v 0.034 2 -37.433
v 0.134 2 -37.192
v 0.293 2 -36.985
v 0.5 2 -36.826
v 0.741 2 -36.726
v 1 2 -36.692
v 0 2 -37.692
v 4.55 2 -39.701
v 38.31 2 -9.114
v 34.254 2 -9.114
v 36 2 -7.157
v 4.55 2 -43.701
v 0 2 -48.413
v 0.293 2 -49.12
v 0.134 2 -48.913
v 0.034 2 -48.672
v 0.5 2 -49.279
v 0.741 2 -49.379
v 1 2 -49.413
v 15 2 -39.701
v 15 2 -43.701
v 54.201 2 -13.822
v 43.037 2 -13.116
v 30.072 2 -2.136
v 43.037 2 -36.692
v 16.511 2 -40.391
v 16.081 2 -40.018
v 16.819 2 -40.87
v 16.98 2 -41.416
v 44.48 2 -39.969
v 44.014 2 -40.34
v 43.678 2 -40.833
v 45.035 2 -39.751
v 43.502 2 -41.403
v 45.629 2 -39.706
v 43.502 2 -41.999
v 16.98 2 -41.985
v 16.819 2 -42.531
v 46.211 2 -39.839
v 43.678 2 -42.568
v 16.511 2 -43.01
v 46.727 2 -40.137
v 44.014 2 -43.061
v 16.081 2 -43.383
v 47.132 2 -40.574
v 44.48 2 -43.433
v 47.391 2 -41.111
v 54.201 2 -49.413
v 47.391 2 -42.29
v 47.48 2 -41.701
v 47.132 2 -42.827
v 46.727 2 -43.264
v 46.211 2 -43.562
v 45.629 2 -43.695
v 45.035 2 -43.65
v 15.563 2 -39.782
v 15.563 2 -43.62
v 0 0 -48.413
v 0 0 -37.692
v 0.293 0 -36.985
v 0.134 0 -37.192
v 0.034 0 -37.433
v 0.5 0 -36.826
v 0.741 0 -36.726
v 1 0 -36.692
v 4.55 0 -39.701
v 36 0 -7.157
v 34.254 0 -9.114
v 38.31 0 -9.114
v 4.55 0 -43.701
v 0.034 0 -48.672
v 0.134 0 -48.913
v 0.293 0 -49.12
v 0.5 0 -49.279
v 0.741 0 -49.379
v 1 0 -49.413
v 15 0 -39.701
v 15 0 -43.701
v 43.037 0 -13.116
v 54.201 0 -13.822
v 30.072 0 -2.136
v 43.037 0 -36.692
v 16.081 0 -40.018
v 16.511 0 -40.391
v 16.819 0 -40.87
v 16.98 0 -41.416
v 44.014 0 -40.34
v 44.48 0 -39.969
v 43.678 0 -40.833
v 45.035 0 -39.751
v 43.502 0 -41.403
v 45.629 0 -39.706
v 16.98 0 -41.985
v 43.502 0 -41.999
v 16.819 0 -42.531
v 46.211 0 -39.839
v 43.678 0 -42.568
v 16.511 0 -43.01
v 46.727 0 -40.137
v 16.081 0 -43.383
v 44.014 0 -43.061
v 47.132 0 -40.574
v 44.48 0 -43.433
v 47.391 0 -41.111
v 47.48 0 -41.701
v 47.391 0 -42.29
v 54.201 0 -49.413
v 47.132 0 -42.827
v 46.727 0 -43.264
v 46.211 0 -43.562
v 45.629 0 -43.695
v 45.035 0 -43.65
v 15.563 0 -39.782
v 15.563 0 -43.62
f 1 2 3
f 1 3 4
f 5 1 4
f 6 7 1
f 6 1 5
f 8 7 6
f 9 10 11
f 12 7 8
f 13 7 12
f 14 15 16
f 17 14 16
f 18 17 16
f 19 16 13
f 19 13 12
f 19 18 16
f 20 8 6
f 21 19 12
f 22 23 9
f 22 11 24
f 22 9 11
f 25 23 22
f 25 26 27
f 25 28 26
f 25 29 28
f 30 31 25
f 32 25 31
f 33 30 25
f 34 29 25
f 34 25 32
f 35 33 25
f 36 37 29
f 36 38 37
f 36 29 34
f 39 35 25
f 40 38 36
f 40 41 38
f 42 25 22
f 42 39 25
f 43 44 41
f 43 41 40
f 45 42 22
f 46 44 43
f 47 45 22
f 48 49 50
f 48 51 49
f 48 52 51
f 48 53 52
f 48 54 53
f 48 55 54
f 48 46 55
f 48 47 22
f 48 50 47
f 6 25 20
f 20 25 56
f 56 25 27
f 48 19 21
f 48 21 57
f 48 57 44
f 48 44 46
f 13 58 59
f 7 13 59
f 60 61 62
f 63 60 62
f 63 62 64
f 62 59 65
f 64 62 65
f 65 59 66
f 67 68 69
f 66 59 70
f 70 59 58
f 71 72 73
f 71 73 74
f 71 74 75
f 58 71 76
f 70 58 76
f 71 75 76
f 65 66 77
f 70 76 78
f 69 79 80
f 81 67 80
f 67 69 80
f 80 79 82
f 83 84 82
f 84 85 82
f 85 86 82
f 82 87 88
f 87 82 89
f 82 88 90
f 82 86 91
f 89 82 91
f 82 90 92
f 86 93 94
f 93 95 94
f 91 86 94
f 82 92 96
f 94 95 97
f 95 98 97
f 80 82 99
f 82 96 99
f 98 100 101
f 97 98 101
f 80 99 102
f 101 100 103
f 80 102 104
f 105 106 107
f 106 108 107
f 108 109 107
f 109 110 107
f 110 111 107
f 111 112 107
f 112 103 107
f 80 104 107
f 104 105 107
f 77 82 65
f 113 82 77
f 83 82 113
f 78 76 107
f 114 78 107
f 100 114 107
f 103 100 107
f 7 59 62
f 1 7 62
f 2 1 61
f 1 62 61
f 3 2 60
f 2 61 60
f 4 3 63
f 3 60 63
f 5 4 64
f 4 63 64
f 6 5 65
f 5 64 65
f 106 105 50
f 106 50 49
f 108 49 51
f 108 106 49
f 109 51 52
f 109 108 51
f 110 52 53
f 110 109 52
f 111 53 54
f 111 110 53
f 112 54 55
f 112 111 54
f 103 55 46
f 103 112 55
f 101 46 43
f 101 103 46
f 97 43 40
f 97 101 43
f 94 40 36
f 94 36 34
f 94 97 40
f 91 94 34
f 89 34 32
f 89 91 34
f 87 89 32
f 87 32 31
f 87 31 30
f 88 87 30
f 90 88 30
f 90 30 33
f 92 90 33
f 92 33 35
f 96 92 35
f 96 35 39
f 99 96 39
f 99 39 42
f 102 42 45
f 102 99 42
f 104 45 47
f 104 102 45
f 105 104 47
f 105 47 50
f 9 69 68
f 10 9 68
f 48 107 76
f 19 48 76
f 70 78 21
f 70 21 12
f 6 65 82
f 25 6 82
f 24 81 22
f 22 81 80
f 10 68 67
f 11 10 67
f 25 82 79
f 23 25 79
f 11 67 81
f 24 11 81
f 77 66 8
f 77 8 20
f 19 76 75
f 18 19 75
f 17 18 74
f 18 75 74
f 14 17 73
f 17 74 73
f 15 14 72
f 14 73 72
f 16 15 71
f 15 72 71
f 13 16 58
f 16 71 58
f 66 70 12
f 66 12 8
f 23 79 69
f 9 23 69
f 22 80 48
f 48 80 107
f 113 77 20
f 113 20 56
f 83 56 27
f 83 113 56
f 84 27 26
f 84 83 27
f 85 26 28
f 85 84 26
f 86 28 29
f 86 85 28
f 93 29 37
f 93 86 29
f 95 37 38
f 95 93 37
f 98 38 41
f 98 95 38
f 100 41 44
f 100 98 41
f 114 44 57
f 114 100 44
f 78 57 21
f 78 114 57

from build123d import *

# Parameters (mm, degrees)
SKETCH1_R           = 2
BOSS_EXTRUDE2_DEPTH = 2


with BuildPart() as part:
    # Sketch1 → Boss-Extrude2 (new body)
    with BuildSketch(Plane(origin=(0, 0, 0), x_dir=(1, 0, 0), z_dir=(0, 1, 0))):
        with BuildLine():
            Line((0, 48.412862342), (0, 37.692030173))
            ThreePointArc((0, 37.692030173), (0.292893219, 36.984923392), (1, 36.692030173))
            Line((1, 36.692030173), (31.48, 36.692030173))
            Line((31.48, 36.692030173), (43.036527631, 36.692030173))
            Line((43.036527631, 36.692030173), (43.036527631, 25.986950269))
            Line((43.036527631, 25.986950269), (43.036527631, 17.132198258))
            Line((43.036527631, 17.132198258), (43.036527631, 13.116497362))
            Line((43.036527631, 13.116497362), (38.310297741, 9.113727486))
            Line((38.310297741, 9.113727486), (34.253582629, 9.113727486))
            Line((34.253582629, 9.113727486), (36, 7.157074844))
            Line((36, 7.157074844), (30.071702425, 2.136241855))
            Line((30.071702425, 2.136241855), (54.200832168, 13.821577266))
            Line((54.200832168, 13.821577266), (54.200832168, 36.692030173))
            Line((54.200832168, 36.692030173), (54.200832168, 49.412862342))
            Line((54.200832168, 49.412862342), (41.48, 49.412862342))
            Line((41.48, 49.412862342), (1, 49.412862342))
            ThreePointArc((1, 49.412862342), (0.292893219, 49.119969123), (0, 48.412862342))
        make_face()
        with Locations((45.48, 41.700609081)):
            Circle(SKETCH1_R, mode=Mode.SUBTRACT)
        with BuildLine():
            Line((15, 43.700609081), (4.549516448, 43.700609081))
            Line((4.549516448, 43.700609081), (4.549516448, 39.700609081))
            Line((4.549516448, 39.700609081), (15, 39.700609081))
            ThreePointArc((15, 39.700609081), (17, 41.700609081), (15, 43.700609081))
        make_face(mode=Mode.SUBTRACT)
    extrude(amount=BOSS_EXTRUDE2_DEPTH)


solid = part.part
